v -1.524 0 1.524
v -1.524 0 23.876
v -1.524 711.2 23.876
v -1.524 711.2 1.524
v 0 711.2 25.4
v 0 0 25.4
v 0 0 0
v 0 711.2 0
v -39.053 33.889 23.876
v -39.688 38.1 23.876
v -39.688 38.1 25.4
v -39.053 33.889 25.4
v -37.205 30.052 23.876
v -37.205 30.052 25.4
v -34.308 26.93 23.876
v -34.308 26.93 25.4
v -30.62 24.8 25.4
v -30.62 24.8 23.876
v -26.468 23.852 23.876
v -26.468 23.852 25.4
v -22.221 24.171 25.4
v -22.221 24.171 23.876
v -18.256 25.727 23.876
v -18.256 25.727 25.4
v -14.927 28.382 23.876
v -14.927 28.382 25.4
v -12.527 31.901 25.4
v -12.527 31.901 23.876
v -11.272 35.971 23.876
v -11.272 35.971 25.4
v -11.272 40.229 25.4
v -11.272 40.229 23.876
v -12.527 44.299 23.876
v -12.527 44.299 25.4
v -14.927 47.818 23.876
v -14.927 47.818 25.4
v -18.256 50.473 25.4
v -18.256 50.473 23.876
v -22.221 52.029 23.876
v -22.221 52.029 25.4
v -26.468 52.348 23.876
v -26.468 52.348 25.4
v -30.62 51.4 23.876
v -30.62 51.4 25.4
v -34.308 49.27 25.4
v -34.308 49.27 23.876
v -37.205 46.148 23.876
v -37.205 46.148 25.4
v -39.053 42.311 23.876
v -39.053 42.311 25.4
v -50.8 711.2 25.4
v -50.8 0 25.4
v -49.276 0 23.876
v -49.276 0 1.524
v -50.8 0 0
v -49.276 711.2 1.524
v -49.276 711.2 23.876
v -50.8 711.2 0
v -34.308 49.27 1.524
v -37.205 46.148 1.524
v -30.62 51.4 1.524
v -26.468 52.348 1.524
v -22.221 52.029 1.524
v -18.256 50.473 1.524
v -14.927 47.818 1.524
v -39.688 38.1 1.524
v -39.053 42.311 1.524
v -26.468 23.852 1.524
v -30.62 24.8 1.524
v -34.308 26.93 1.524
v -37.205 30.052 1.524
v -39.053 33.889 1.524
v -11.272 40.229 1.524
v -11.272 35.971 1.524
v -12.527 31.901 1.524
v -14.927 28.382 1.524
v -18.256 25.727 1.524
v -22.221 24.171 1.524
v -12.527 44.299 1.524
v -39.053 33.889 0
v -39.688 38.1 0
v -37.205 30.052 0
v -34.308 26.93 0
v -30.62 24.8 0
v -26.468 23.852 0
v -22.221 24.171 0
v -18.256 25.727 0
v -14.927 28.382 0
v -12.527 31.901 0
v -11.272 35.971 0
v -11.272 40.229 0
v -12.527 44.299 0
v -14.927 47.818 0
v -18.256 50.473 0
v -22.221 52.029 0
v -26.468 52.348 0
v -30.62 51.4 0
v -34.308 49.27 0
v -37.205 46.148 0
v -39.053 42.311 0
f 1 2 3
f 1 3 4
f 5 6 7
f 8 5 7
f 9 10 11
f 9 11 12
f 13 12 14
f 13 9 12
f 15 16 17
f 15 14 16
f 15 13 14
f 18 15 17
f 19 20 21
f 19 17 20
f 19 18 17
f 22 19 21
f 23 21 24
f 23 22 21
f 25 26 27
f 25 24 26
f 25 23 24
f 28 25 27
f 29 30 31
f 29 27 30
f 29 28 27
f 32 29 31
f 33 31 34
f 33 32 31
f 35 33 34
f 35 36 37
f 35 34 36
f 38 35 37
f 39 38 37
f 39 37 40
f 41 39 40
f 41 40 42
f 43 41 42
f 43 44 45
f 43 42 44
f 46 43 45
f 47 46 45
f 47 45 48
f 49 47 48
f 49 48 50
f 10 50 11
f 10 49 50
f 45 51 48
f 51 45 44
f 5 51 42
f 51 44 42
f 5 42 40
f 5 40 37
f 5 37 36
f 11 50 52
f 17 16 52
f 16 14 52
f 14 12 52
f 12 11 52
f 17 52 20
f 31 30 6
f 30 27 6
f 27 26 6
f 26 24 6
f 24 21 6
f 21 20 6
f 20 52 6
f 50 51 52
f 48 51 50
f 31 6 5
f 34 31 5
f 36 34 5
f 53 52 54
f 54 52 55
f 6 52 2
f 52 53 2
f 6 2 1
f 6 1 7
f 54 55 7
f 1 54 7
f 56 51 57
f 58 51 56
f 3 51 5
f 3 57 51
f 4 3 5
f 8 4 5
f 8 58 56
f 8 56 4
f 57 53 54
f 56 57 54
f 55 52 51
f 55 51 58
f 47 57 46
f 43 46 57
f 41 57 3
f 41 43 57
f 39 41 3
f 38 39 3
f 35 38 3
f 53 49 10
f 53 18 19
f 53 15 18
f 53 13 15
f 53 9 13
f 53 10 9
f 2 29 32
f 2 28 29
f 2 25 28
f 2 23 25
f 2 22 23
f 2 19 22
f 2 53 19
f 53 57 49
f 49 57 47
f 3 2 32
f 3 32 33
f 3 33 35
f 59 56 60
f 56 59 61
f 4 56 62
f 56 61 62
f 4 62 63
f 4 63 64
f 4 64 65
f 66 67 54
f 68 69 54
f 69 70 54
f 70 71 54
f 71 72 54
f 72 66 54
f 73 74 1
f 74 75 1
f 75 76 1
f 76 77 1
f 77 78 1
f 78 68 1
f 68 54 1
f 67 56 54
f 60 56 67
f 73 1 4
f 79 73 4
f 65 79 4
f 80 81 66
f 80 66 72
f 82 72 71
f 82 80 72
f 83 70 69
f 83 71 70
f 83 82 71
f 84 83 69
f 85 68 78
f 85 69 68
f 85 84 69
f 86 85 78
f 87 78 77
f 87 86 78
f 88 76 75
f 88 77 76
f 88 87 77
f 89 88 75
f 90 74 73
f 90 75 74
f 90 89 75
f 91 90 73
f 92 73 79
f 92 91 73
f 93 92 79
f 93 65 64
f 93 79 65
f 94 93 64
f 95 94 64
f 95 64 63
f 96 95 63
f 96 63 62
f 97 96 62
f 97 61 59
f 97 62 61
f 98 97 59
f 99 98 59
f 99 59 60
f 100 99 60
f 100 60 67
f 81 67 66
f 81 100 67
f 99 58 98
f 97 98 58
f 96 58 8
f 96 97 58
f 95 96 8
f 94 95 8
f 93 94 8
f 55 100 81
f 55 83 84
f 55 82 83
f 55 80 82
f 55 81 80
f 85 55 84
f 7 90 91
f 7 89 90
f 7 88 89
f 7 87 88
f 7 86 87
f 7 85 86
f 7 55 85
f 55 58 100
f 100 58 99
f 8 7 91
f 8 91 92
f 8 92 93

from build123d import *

# Parameters (mm, degrees)
SKETCH1_W               = 50.8
SKETCH1_H               = 25.4
SKETCH1_W_2             = 47.752
SKETCH1_H_2             = 22.352
EXTRUDE_THIN1_DEPTH     = 711.2
CUT_EXTRUDE1_DEPTH      = 714.464252784
CUT_EXTRUDE1_DEPTH_BACK = 714.464252784
SKETCH2_R               = 14.2875


with BuildPart() as part:
    # Sketch1 → Extrude-Thin1 (new body)
    with BuildSketch(Plane(origin=(0, 0, 0), x_dir=(1, 0, 0), z_dir=(0, 1, 0))):
        with Locations((-25.4, -12.7)):
            Rectangle(SKETCH1_W, SKETCH1_H)
        with Locations((-25.4, -12.7)):
            Rectangle(SKETCH1_W_2, SKETCH1_H_2, mode=Mode.SUBTRACT)
    extrude(amount=EXTRUDE_THIN1_DEPTH)

    # Sketch2 → Cut-Extrude1 (cut, two sides: drawn at the far end of the back side and taken through both)
    with BuildSketch(Plane.XY.offset(25.4).offset(-CUT_EXTRUDE1_DEPTH_BACK)):
        with Locations(Location((-25.4, 38.1, 0), (0, 0, 180))):
            Circle(SKETCH2_R)
    extrude(amount=CUT_EXTRUDE1_DEPTH + CUT_EXTRUDE1_DEPTH_BACK, mode=Mode.SUBTRACT)


solid = part.part
